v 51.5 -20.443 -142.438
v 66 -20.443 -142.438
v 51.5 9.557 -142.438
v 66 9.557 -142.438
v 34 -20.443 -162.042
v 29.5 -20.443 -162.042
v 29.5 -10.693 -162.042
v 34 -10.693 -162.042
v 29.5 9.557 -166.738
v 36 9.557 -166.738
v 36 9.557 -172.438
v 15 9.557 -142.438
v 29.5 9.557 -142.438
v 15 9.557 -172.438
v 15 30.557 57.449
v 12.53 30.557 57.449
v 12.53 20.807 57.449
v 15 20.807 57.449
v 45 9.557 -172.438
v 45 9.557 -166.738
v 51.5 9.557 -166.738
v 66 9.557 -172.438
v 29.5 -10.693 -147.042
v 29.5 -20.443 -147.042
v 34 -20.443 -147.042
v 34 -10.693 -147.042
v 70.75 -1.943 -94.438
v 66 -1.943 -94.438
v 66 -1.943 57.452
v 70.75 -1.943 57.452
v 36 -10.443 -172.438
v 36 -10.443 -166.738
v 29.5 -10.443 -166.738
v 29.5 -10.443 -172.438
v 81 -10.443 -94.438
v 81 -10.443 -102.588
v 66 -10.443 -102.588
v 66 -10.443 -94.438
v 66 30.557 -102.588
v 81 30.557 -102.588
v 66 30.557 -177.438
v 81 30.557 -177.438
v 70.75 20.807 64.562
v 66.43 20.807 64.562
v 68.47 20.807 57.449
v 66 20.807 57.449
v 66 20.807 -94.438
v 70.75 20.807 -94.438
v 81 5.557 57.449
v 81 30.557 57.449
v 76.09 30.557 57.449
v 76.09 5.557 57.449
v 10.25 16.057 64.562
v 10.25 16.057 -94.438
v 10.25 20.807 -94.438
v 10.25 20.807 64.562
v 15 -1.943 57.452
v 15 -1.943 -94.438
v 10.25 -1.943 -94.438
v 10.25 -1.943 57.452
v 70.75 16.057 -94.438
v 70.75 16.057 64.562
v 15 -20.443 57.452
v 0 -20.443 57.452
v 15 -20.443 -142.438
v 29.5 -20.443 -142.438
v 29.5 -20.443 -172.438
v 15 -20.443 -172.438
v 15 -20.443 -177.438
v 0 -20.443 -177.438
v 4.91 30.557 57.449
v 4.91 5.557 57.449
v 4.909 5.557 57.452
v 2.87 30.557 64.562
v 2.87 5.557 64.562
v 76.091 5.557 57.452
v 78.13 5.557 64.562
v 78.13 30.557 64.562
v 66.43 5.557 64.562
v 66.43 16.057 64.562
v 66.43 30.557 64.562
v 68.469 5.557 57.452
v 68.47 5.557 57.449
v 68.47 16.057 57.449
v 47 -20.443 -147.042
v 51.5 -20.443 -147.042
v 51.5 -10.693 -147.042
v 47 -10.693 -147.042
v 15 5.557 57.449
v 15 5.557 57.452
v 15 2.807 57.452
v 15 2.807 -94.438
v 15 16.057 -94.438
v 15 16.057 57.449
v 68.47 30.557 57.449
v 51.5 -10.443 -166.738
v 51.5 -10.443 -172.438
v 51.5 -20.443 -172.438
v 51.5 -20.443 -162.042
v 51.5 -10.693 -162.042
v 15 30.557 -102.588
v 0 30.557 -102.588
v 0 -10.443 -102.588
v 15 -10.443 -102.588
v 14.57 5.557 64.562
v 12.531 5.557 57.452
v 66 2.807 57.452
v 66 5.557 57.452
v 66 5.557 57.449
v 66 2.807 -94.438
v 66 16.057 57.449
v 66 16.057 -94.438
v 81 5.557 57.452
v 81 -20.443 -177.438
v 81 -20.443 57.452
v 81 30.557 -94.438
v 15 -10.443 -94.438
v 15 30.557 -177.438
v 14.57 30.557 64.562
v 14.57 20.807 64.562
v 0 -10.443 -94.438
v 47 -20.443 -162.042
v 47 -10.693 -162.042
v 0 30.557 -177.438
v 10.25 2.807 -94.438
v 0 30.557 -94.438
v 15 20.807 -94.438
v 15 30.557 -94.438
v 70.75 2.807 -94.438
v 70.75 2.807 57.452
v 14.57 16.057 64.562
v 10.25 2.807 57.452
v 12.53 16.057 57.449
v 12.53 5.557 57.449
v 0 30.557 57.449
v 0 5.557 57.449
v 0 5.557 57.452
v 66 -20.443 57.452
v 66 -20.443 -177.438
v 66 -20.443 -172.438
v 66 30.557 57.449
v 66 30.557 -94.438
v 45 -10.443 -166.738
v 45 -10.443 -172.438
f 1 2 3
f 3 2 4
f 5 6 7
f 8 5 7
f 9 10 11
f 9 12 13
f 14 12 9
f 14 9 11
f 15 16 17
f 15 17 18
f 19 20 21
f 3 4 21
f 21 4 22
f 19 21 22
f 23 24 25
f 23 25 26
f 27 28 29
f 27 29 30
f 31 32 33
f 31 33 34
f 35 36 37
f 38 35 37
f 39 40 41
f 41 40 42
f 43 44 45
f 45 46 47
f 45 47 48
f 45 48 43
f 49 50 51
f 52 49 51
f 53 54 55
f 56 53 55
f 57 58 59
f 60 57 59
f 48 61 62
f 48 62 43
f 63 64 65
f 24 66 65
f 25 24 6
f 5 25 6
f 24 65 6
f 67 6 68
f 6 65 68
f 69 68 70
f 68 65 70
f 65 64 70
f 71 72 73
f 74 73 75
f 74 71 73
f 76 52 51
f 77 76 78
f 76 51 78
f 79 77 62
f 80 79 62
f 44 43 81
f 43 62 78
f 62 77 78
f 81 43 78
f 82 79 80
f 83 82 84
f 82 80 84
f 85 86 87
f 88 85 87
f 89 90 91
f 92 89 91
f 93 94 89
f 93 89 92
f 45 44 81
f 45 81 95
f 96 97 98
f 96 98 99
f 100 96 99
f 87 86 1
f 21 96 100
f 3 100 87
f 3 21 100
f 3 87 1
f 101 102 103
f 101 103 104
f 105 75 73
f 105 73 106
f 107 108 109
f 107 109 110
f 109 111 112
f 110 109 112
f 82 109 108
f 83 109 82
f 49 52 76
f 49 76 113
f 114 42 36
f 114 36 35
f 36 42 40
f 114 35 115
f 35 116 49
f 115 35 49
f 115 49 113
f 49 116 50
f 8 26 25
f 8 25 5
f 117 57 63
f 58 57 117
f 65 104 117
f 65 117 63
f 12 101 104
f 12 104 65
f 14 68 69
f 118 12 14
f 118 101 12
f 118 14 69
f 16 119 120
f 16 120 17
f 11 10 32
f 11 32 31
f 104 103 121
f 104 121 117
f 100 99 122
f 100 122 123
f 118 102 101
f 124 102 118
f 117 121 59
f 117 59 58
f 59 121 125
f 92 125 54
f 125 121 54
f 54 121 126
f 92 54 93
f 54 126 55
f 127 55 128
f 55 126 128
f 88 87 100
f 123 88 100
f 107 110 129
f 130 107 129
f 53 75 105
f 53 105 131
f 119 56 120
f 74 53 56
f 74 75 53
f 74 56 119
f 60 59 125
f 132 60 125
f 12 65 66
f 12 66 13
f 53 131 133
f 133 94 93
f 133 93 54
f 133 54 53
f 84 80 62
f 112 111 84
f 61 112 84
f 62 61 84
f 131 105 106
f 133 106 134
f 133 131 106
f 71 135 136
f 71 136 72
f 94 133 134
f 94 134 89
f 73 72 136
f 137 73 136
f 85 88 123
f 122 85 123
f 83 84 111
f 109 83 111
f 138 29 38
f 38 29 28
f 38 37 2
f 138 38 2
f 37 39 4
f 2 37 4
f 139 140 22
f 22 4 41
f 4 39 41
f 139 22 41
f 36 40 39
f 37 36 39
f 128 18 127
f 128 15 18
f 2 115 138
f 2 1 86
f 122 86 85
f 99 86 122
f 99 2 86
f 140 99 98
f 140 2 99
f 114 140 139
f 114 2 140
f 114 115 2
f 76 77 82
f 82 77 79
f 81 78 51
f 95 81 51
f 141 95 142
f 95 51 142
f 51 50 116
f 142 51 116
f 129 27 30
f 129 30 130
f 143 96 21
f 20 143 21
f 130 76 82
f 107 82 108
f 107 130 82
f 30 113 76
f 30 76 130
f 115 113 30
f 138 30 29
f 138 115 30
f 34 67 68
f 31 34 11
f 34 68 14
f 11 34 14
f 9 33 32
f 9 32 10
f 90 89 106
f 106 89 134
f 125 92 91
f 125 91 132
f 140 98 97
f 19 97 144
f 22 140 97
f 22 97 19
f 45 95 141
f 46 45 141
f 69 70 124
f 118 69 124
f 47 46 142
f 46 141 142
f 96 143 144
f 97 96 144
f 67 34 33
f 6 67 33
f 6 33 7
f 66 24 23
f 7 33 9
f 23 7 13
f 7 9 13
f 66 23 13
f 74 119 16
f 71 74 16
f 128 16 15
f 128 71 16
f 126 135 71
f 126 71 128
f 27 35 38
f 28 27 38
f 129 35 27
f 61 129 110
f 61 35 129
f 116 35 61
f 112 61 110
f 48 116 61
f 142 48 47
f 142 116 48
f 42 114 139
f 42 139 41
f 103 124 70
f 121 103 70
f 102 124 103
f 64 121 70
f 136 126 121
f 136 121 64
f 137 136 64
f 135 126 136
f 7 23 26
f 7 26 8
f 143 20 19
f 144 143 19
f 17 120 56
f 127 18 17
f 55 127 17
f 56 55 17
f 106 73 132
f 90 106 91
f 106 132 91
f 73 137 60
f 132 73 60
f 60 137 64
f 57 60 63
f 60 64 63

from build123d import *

# Parameters (mm, degrees)
SKETCH1_W           = 242
SKETCH1_H           = 51
BOSS_EXTRUDE1_DEPTH = 15
SKETCH26_W          = 30
SKETCH26_H          = 30
BOSS_EXTRUDE3_DEPTH = 29.5
SKETCH28_W          = 15
SKETCH28_H          = 9.75
BOSS_EXTRUDE5_DEPTH = 4.5
SKETCH29_W          = 5.7
SKETCH29_H          = 20
BOSS_EXTRUDE6_DEPTH = 6.5
CUT_EXTRUDE8_DEPTH  = 25
SKETCH13_W          = 15
SKETCH13_H          = 7.11
CUT_EXTRUDE9_DEPTH  = 26
SKETCH17_W          = 15
SKETCH17_H          = 8.15
CUT_EXTRUDE10_DEPTH = 41
SKETCH7_W           = 4.75
SKETCH7_H           = 4.75
CUT_EXTRUDE5_DEPTH  = 165


with BuildPart() as part:
    # Sketch1 → Boss-Extrude1 (new body)
    with BuildSketch(Plane(origin=(0, 0, 0), x_dir=(0, 0, -1), z_dir=(1, 0, 0))):
        with Locations((56.437921078, 5.057266603)):
            Rectangle(SKETCH1_W, SKETCH1_H)
    extrude(amount=BOSS_EXTRUDE1_DEPTH)

    # Sketch26 → Boss-Extrude3 (add)
    with BuildSketch(Plane.ZY):
        with Locations((-157.437921078, -5.442733397)):
            Rectangle(SKETCH26_W, SKETCH26_H)
    extrude(amount=-BOSS_EXTRUDE3_DEPTH)

    # Sketch28 → Boss-Extrude5 (add)
    with BuildSketch(Plane(origin=(29.5, 0, 0), x_dir=(0, 0, -1), z_dir=(1, 0, 0))):
        with Locations((154.541661602, -15.567733397)):
            Rectangle(SKETCH28_W, SKETCH28_H)
    extrude(amount=BOSS_EXTRUDE5_DEPTH)

    # Sketch29 → Boss-Extrude6 (add)
    with BuildSketch(Plane(origin=(29.5, 0, 0), x_dir=(0, 0, -1), z_dir=(1, 0, 0))):
        with Locations((169.587921078, -0.442733397)):
            Rectangle(SKETCH29_W, SKETCH29_H)
    extrude(amount=BOSS_EXTRUDE6_DEPTH)

    # Sketch12 → Cut-Extrude8 (cut)
    with BuildSketch(Plane(origin=(0, 30.557266603, 0), x_dir=(1, 0, 0), z_dir=(0, 1, 0))):
        Polygon((0, -57.448742372), (4.909716433, -57.448742372), (2.87, -64.562078922), (0, -64.562078922), align=None)
        Polygon((15, -57.448742372), (15, -64.562078922), (14.57, -64.562078922), (12.530283567, -57.448742372), align=None)
    extrude(amount=-CUT_EXTRUDE8_DEPTH, mode=Mode.SUBTRACT)

    # Sketch13 → Cut-Extrude9 (cut)
    with BuildSketch(Plane.XZ.offset(20.442733397)):
        with Locations((7.5, 61.007078922)):
            Rectangle(SKETCH13_W, SKETCH13_H)
    extrude(amount=-CUT_EXTRUDE9_DEPTH, mode=Mode.SUBTRACT)

    # Sketch17 → Cut-Extrude10 (cut)
    with BuildSketch(Plane(origin=(0, 30.557266603, 0), x_dir=(1, 0, 0), z_dir=(0, 1, 0))):
        with Locations((7.5, 98.512921078)):
            Rectangle(SKETCH17_W, SKETCH17_H)
    extrude(amount=-CUT_EXTRUDE10_DEPTH, mode=Mode.SUBTRACT)

    # Sketch7 → Cut-Extrude5 (cut)
    with BuildSketch(Plane(origin=(0, 0, -94.437921078), x_dir=(-1, 0, 0), z_dir=(0, 0, -1))):
        with Locations((-12.625, 0.432266603)):
            Rectangle(SKETCH7_W, SKETCH7_H)
        with Locations((-12.625, 18.432266603)):
            Rectangle(SKETCH7_W, SKETCH7_H)
    extrude(amount=-CUT_EXTRUDE5_DEPTH, mode=Mode.SUBTRACT)


with BuildPart() as body_2:
    # Mirror4: mirrored copy
    add(part.part.mirror(Plane(origin=(40.5, 0, 0), x_dir=(0, 0, 1), z_dir=(1, 0, 0))))


solid = Compound([part.part, body_2.part])
